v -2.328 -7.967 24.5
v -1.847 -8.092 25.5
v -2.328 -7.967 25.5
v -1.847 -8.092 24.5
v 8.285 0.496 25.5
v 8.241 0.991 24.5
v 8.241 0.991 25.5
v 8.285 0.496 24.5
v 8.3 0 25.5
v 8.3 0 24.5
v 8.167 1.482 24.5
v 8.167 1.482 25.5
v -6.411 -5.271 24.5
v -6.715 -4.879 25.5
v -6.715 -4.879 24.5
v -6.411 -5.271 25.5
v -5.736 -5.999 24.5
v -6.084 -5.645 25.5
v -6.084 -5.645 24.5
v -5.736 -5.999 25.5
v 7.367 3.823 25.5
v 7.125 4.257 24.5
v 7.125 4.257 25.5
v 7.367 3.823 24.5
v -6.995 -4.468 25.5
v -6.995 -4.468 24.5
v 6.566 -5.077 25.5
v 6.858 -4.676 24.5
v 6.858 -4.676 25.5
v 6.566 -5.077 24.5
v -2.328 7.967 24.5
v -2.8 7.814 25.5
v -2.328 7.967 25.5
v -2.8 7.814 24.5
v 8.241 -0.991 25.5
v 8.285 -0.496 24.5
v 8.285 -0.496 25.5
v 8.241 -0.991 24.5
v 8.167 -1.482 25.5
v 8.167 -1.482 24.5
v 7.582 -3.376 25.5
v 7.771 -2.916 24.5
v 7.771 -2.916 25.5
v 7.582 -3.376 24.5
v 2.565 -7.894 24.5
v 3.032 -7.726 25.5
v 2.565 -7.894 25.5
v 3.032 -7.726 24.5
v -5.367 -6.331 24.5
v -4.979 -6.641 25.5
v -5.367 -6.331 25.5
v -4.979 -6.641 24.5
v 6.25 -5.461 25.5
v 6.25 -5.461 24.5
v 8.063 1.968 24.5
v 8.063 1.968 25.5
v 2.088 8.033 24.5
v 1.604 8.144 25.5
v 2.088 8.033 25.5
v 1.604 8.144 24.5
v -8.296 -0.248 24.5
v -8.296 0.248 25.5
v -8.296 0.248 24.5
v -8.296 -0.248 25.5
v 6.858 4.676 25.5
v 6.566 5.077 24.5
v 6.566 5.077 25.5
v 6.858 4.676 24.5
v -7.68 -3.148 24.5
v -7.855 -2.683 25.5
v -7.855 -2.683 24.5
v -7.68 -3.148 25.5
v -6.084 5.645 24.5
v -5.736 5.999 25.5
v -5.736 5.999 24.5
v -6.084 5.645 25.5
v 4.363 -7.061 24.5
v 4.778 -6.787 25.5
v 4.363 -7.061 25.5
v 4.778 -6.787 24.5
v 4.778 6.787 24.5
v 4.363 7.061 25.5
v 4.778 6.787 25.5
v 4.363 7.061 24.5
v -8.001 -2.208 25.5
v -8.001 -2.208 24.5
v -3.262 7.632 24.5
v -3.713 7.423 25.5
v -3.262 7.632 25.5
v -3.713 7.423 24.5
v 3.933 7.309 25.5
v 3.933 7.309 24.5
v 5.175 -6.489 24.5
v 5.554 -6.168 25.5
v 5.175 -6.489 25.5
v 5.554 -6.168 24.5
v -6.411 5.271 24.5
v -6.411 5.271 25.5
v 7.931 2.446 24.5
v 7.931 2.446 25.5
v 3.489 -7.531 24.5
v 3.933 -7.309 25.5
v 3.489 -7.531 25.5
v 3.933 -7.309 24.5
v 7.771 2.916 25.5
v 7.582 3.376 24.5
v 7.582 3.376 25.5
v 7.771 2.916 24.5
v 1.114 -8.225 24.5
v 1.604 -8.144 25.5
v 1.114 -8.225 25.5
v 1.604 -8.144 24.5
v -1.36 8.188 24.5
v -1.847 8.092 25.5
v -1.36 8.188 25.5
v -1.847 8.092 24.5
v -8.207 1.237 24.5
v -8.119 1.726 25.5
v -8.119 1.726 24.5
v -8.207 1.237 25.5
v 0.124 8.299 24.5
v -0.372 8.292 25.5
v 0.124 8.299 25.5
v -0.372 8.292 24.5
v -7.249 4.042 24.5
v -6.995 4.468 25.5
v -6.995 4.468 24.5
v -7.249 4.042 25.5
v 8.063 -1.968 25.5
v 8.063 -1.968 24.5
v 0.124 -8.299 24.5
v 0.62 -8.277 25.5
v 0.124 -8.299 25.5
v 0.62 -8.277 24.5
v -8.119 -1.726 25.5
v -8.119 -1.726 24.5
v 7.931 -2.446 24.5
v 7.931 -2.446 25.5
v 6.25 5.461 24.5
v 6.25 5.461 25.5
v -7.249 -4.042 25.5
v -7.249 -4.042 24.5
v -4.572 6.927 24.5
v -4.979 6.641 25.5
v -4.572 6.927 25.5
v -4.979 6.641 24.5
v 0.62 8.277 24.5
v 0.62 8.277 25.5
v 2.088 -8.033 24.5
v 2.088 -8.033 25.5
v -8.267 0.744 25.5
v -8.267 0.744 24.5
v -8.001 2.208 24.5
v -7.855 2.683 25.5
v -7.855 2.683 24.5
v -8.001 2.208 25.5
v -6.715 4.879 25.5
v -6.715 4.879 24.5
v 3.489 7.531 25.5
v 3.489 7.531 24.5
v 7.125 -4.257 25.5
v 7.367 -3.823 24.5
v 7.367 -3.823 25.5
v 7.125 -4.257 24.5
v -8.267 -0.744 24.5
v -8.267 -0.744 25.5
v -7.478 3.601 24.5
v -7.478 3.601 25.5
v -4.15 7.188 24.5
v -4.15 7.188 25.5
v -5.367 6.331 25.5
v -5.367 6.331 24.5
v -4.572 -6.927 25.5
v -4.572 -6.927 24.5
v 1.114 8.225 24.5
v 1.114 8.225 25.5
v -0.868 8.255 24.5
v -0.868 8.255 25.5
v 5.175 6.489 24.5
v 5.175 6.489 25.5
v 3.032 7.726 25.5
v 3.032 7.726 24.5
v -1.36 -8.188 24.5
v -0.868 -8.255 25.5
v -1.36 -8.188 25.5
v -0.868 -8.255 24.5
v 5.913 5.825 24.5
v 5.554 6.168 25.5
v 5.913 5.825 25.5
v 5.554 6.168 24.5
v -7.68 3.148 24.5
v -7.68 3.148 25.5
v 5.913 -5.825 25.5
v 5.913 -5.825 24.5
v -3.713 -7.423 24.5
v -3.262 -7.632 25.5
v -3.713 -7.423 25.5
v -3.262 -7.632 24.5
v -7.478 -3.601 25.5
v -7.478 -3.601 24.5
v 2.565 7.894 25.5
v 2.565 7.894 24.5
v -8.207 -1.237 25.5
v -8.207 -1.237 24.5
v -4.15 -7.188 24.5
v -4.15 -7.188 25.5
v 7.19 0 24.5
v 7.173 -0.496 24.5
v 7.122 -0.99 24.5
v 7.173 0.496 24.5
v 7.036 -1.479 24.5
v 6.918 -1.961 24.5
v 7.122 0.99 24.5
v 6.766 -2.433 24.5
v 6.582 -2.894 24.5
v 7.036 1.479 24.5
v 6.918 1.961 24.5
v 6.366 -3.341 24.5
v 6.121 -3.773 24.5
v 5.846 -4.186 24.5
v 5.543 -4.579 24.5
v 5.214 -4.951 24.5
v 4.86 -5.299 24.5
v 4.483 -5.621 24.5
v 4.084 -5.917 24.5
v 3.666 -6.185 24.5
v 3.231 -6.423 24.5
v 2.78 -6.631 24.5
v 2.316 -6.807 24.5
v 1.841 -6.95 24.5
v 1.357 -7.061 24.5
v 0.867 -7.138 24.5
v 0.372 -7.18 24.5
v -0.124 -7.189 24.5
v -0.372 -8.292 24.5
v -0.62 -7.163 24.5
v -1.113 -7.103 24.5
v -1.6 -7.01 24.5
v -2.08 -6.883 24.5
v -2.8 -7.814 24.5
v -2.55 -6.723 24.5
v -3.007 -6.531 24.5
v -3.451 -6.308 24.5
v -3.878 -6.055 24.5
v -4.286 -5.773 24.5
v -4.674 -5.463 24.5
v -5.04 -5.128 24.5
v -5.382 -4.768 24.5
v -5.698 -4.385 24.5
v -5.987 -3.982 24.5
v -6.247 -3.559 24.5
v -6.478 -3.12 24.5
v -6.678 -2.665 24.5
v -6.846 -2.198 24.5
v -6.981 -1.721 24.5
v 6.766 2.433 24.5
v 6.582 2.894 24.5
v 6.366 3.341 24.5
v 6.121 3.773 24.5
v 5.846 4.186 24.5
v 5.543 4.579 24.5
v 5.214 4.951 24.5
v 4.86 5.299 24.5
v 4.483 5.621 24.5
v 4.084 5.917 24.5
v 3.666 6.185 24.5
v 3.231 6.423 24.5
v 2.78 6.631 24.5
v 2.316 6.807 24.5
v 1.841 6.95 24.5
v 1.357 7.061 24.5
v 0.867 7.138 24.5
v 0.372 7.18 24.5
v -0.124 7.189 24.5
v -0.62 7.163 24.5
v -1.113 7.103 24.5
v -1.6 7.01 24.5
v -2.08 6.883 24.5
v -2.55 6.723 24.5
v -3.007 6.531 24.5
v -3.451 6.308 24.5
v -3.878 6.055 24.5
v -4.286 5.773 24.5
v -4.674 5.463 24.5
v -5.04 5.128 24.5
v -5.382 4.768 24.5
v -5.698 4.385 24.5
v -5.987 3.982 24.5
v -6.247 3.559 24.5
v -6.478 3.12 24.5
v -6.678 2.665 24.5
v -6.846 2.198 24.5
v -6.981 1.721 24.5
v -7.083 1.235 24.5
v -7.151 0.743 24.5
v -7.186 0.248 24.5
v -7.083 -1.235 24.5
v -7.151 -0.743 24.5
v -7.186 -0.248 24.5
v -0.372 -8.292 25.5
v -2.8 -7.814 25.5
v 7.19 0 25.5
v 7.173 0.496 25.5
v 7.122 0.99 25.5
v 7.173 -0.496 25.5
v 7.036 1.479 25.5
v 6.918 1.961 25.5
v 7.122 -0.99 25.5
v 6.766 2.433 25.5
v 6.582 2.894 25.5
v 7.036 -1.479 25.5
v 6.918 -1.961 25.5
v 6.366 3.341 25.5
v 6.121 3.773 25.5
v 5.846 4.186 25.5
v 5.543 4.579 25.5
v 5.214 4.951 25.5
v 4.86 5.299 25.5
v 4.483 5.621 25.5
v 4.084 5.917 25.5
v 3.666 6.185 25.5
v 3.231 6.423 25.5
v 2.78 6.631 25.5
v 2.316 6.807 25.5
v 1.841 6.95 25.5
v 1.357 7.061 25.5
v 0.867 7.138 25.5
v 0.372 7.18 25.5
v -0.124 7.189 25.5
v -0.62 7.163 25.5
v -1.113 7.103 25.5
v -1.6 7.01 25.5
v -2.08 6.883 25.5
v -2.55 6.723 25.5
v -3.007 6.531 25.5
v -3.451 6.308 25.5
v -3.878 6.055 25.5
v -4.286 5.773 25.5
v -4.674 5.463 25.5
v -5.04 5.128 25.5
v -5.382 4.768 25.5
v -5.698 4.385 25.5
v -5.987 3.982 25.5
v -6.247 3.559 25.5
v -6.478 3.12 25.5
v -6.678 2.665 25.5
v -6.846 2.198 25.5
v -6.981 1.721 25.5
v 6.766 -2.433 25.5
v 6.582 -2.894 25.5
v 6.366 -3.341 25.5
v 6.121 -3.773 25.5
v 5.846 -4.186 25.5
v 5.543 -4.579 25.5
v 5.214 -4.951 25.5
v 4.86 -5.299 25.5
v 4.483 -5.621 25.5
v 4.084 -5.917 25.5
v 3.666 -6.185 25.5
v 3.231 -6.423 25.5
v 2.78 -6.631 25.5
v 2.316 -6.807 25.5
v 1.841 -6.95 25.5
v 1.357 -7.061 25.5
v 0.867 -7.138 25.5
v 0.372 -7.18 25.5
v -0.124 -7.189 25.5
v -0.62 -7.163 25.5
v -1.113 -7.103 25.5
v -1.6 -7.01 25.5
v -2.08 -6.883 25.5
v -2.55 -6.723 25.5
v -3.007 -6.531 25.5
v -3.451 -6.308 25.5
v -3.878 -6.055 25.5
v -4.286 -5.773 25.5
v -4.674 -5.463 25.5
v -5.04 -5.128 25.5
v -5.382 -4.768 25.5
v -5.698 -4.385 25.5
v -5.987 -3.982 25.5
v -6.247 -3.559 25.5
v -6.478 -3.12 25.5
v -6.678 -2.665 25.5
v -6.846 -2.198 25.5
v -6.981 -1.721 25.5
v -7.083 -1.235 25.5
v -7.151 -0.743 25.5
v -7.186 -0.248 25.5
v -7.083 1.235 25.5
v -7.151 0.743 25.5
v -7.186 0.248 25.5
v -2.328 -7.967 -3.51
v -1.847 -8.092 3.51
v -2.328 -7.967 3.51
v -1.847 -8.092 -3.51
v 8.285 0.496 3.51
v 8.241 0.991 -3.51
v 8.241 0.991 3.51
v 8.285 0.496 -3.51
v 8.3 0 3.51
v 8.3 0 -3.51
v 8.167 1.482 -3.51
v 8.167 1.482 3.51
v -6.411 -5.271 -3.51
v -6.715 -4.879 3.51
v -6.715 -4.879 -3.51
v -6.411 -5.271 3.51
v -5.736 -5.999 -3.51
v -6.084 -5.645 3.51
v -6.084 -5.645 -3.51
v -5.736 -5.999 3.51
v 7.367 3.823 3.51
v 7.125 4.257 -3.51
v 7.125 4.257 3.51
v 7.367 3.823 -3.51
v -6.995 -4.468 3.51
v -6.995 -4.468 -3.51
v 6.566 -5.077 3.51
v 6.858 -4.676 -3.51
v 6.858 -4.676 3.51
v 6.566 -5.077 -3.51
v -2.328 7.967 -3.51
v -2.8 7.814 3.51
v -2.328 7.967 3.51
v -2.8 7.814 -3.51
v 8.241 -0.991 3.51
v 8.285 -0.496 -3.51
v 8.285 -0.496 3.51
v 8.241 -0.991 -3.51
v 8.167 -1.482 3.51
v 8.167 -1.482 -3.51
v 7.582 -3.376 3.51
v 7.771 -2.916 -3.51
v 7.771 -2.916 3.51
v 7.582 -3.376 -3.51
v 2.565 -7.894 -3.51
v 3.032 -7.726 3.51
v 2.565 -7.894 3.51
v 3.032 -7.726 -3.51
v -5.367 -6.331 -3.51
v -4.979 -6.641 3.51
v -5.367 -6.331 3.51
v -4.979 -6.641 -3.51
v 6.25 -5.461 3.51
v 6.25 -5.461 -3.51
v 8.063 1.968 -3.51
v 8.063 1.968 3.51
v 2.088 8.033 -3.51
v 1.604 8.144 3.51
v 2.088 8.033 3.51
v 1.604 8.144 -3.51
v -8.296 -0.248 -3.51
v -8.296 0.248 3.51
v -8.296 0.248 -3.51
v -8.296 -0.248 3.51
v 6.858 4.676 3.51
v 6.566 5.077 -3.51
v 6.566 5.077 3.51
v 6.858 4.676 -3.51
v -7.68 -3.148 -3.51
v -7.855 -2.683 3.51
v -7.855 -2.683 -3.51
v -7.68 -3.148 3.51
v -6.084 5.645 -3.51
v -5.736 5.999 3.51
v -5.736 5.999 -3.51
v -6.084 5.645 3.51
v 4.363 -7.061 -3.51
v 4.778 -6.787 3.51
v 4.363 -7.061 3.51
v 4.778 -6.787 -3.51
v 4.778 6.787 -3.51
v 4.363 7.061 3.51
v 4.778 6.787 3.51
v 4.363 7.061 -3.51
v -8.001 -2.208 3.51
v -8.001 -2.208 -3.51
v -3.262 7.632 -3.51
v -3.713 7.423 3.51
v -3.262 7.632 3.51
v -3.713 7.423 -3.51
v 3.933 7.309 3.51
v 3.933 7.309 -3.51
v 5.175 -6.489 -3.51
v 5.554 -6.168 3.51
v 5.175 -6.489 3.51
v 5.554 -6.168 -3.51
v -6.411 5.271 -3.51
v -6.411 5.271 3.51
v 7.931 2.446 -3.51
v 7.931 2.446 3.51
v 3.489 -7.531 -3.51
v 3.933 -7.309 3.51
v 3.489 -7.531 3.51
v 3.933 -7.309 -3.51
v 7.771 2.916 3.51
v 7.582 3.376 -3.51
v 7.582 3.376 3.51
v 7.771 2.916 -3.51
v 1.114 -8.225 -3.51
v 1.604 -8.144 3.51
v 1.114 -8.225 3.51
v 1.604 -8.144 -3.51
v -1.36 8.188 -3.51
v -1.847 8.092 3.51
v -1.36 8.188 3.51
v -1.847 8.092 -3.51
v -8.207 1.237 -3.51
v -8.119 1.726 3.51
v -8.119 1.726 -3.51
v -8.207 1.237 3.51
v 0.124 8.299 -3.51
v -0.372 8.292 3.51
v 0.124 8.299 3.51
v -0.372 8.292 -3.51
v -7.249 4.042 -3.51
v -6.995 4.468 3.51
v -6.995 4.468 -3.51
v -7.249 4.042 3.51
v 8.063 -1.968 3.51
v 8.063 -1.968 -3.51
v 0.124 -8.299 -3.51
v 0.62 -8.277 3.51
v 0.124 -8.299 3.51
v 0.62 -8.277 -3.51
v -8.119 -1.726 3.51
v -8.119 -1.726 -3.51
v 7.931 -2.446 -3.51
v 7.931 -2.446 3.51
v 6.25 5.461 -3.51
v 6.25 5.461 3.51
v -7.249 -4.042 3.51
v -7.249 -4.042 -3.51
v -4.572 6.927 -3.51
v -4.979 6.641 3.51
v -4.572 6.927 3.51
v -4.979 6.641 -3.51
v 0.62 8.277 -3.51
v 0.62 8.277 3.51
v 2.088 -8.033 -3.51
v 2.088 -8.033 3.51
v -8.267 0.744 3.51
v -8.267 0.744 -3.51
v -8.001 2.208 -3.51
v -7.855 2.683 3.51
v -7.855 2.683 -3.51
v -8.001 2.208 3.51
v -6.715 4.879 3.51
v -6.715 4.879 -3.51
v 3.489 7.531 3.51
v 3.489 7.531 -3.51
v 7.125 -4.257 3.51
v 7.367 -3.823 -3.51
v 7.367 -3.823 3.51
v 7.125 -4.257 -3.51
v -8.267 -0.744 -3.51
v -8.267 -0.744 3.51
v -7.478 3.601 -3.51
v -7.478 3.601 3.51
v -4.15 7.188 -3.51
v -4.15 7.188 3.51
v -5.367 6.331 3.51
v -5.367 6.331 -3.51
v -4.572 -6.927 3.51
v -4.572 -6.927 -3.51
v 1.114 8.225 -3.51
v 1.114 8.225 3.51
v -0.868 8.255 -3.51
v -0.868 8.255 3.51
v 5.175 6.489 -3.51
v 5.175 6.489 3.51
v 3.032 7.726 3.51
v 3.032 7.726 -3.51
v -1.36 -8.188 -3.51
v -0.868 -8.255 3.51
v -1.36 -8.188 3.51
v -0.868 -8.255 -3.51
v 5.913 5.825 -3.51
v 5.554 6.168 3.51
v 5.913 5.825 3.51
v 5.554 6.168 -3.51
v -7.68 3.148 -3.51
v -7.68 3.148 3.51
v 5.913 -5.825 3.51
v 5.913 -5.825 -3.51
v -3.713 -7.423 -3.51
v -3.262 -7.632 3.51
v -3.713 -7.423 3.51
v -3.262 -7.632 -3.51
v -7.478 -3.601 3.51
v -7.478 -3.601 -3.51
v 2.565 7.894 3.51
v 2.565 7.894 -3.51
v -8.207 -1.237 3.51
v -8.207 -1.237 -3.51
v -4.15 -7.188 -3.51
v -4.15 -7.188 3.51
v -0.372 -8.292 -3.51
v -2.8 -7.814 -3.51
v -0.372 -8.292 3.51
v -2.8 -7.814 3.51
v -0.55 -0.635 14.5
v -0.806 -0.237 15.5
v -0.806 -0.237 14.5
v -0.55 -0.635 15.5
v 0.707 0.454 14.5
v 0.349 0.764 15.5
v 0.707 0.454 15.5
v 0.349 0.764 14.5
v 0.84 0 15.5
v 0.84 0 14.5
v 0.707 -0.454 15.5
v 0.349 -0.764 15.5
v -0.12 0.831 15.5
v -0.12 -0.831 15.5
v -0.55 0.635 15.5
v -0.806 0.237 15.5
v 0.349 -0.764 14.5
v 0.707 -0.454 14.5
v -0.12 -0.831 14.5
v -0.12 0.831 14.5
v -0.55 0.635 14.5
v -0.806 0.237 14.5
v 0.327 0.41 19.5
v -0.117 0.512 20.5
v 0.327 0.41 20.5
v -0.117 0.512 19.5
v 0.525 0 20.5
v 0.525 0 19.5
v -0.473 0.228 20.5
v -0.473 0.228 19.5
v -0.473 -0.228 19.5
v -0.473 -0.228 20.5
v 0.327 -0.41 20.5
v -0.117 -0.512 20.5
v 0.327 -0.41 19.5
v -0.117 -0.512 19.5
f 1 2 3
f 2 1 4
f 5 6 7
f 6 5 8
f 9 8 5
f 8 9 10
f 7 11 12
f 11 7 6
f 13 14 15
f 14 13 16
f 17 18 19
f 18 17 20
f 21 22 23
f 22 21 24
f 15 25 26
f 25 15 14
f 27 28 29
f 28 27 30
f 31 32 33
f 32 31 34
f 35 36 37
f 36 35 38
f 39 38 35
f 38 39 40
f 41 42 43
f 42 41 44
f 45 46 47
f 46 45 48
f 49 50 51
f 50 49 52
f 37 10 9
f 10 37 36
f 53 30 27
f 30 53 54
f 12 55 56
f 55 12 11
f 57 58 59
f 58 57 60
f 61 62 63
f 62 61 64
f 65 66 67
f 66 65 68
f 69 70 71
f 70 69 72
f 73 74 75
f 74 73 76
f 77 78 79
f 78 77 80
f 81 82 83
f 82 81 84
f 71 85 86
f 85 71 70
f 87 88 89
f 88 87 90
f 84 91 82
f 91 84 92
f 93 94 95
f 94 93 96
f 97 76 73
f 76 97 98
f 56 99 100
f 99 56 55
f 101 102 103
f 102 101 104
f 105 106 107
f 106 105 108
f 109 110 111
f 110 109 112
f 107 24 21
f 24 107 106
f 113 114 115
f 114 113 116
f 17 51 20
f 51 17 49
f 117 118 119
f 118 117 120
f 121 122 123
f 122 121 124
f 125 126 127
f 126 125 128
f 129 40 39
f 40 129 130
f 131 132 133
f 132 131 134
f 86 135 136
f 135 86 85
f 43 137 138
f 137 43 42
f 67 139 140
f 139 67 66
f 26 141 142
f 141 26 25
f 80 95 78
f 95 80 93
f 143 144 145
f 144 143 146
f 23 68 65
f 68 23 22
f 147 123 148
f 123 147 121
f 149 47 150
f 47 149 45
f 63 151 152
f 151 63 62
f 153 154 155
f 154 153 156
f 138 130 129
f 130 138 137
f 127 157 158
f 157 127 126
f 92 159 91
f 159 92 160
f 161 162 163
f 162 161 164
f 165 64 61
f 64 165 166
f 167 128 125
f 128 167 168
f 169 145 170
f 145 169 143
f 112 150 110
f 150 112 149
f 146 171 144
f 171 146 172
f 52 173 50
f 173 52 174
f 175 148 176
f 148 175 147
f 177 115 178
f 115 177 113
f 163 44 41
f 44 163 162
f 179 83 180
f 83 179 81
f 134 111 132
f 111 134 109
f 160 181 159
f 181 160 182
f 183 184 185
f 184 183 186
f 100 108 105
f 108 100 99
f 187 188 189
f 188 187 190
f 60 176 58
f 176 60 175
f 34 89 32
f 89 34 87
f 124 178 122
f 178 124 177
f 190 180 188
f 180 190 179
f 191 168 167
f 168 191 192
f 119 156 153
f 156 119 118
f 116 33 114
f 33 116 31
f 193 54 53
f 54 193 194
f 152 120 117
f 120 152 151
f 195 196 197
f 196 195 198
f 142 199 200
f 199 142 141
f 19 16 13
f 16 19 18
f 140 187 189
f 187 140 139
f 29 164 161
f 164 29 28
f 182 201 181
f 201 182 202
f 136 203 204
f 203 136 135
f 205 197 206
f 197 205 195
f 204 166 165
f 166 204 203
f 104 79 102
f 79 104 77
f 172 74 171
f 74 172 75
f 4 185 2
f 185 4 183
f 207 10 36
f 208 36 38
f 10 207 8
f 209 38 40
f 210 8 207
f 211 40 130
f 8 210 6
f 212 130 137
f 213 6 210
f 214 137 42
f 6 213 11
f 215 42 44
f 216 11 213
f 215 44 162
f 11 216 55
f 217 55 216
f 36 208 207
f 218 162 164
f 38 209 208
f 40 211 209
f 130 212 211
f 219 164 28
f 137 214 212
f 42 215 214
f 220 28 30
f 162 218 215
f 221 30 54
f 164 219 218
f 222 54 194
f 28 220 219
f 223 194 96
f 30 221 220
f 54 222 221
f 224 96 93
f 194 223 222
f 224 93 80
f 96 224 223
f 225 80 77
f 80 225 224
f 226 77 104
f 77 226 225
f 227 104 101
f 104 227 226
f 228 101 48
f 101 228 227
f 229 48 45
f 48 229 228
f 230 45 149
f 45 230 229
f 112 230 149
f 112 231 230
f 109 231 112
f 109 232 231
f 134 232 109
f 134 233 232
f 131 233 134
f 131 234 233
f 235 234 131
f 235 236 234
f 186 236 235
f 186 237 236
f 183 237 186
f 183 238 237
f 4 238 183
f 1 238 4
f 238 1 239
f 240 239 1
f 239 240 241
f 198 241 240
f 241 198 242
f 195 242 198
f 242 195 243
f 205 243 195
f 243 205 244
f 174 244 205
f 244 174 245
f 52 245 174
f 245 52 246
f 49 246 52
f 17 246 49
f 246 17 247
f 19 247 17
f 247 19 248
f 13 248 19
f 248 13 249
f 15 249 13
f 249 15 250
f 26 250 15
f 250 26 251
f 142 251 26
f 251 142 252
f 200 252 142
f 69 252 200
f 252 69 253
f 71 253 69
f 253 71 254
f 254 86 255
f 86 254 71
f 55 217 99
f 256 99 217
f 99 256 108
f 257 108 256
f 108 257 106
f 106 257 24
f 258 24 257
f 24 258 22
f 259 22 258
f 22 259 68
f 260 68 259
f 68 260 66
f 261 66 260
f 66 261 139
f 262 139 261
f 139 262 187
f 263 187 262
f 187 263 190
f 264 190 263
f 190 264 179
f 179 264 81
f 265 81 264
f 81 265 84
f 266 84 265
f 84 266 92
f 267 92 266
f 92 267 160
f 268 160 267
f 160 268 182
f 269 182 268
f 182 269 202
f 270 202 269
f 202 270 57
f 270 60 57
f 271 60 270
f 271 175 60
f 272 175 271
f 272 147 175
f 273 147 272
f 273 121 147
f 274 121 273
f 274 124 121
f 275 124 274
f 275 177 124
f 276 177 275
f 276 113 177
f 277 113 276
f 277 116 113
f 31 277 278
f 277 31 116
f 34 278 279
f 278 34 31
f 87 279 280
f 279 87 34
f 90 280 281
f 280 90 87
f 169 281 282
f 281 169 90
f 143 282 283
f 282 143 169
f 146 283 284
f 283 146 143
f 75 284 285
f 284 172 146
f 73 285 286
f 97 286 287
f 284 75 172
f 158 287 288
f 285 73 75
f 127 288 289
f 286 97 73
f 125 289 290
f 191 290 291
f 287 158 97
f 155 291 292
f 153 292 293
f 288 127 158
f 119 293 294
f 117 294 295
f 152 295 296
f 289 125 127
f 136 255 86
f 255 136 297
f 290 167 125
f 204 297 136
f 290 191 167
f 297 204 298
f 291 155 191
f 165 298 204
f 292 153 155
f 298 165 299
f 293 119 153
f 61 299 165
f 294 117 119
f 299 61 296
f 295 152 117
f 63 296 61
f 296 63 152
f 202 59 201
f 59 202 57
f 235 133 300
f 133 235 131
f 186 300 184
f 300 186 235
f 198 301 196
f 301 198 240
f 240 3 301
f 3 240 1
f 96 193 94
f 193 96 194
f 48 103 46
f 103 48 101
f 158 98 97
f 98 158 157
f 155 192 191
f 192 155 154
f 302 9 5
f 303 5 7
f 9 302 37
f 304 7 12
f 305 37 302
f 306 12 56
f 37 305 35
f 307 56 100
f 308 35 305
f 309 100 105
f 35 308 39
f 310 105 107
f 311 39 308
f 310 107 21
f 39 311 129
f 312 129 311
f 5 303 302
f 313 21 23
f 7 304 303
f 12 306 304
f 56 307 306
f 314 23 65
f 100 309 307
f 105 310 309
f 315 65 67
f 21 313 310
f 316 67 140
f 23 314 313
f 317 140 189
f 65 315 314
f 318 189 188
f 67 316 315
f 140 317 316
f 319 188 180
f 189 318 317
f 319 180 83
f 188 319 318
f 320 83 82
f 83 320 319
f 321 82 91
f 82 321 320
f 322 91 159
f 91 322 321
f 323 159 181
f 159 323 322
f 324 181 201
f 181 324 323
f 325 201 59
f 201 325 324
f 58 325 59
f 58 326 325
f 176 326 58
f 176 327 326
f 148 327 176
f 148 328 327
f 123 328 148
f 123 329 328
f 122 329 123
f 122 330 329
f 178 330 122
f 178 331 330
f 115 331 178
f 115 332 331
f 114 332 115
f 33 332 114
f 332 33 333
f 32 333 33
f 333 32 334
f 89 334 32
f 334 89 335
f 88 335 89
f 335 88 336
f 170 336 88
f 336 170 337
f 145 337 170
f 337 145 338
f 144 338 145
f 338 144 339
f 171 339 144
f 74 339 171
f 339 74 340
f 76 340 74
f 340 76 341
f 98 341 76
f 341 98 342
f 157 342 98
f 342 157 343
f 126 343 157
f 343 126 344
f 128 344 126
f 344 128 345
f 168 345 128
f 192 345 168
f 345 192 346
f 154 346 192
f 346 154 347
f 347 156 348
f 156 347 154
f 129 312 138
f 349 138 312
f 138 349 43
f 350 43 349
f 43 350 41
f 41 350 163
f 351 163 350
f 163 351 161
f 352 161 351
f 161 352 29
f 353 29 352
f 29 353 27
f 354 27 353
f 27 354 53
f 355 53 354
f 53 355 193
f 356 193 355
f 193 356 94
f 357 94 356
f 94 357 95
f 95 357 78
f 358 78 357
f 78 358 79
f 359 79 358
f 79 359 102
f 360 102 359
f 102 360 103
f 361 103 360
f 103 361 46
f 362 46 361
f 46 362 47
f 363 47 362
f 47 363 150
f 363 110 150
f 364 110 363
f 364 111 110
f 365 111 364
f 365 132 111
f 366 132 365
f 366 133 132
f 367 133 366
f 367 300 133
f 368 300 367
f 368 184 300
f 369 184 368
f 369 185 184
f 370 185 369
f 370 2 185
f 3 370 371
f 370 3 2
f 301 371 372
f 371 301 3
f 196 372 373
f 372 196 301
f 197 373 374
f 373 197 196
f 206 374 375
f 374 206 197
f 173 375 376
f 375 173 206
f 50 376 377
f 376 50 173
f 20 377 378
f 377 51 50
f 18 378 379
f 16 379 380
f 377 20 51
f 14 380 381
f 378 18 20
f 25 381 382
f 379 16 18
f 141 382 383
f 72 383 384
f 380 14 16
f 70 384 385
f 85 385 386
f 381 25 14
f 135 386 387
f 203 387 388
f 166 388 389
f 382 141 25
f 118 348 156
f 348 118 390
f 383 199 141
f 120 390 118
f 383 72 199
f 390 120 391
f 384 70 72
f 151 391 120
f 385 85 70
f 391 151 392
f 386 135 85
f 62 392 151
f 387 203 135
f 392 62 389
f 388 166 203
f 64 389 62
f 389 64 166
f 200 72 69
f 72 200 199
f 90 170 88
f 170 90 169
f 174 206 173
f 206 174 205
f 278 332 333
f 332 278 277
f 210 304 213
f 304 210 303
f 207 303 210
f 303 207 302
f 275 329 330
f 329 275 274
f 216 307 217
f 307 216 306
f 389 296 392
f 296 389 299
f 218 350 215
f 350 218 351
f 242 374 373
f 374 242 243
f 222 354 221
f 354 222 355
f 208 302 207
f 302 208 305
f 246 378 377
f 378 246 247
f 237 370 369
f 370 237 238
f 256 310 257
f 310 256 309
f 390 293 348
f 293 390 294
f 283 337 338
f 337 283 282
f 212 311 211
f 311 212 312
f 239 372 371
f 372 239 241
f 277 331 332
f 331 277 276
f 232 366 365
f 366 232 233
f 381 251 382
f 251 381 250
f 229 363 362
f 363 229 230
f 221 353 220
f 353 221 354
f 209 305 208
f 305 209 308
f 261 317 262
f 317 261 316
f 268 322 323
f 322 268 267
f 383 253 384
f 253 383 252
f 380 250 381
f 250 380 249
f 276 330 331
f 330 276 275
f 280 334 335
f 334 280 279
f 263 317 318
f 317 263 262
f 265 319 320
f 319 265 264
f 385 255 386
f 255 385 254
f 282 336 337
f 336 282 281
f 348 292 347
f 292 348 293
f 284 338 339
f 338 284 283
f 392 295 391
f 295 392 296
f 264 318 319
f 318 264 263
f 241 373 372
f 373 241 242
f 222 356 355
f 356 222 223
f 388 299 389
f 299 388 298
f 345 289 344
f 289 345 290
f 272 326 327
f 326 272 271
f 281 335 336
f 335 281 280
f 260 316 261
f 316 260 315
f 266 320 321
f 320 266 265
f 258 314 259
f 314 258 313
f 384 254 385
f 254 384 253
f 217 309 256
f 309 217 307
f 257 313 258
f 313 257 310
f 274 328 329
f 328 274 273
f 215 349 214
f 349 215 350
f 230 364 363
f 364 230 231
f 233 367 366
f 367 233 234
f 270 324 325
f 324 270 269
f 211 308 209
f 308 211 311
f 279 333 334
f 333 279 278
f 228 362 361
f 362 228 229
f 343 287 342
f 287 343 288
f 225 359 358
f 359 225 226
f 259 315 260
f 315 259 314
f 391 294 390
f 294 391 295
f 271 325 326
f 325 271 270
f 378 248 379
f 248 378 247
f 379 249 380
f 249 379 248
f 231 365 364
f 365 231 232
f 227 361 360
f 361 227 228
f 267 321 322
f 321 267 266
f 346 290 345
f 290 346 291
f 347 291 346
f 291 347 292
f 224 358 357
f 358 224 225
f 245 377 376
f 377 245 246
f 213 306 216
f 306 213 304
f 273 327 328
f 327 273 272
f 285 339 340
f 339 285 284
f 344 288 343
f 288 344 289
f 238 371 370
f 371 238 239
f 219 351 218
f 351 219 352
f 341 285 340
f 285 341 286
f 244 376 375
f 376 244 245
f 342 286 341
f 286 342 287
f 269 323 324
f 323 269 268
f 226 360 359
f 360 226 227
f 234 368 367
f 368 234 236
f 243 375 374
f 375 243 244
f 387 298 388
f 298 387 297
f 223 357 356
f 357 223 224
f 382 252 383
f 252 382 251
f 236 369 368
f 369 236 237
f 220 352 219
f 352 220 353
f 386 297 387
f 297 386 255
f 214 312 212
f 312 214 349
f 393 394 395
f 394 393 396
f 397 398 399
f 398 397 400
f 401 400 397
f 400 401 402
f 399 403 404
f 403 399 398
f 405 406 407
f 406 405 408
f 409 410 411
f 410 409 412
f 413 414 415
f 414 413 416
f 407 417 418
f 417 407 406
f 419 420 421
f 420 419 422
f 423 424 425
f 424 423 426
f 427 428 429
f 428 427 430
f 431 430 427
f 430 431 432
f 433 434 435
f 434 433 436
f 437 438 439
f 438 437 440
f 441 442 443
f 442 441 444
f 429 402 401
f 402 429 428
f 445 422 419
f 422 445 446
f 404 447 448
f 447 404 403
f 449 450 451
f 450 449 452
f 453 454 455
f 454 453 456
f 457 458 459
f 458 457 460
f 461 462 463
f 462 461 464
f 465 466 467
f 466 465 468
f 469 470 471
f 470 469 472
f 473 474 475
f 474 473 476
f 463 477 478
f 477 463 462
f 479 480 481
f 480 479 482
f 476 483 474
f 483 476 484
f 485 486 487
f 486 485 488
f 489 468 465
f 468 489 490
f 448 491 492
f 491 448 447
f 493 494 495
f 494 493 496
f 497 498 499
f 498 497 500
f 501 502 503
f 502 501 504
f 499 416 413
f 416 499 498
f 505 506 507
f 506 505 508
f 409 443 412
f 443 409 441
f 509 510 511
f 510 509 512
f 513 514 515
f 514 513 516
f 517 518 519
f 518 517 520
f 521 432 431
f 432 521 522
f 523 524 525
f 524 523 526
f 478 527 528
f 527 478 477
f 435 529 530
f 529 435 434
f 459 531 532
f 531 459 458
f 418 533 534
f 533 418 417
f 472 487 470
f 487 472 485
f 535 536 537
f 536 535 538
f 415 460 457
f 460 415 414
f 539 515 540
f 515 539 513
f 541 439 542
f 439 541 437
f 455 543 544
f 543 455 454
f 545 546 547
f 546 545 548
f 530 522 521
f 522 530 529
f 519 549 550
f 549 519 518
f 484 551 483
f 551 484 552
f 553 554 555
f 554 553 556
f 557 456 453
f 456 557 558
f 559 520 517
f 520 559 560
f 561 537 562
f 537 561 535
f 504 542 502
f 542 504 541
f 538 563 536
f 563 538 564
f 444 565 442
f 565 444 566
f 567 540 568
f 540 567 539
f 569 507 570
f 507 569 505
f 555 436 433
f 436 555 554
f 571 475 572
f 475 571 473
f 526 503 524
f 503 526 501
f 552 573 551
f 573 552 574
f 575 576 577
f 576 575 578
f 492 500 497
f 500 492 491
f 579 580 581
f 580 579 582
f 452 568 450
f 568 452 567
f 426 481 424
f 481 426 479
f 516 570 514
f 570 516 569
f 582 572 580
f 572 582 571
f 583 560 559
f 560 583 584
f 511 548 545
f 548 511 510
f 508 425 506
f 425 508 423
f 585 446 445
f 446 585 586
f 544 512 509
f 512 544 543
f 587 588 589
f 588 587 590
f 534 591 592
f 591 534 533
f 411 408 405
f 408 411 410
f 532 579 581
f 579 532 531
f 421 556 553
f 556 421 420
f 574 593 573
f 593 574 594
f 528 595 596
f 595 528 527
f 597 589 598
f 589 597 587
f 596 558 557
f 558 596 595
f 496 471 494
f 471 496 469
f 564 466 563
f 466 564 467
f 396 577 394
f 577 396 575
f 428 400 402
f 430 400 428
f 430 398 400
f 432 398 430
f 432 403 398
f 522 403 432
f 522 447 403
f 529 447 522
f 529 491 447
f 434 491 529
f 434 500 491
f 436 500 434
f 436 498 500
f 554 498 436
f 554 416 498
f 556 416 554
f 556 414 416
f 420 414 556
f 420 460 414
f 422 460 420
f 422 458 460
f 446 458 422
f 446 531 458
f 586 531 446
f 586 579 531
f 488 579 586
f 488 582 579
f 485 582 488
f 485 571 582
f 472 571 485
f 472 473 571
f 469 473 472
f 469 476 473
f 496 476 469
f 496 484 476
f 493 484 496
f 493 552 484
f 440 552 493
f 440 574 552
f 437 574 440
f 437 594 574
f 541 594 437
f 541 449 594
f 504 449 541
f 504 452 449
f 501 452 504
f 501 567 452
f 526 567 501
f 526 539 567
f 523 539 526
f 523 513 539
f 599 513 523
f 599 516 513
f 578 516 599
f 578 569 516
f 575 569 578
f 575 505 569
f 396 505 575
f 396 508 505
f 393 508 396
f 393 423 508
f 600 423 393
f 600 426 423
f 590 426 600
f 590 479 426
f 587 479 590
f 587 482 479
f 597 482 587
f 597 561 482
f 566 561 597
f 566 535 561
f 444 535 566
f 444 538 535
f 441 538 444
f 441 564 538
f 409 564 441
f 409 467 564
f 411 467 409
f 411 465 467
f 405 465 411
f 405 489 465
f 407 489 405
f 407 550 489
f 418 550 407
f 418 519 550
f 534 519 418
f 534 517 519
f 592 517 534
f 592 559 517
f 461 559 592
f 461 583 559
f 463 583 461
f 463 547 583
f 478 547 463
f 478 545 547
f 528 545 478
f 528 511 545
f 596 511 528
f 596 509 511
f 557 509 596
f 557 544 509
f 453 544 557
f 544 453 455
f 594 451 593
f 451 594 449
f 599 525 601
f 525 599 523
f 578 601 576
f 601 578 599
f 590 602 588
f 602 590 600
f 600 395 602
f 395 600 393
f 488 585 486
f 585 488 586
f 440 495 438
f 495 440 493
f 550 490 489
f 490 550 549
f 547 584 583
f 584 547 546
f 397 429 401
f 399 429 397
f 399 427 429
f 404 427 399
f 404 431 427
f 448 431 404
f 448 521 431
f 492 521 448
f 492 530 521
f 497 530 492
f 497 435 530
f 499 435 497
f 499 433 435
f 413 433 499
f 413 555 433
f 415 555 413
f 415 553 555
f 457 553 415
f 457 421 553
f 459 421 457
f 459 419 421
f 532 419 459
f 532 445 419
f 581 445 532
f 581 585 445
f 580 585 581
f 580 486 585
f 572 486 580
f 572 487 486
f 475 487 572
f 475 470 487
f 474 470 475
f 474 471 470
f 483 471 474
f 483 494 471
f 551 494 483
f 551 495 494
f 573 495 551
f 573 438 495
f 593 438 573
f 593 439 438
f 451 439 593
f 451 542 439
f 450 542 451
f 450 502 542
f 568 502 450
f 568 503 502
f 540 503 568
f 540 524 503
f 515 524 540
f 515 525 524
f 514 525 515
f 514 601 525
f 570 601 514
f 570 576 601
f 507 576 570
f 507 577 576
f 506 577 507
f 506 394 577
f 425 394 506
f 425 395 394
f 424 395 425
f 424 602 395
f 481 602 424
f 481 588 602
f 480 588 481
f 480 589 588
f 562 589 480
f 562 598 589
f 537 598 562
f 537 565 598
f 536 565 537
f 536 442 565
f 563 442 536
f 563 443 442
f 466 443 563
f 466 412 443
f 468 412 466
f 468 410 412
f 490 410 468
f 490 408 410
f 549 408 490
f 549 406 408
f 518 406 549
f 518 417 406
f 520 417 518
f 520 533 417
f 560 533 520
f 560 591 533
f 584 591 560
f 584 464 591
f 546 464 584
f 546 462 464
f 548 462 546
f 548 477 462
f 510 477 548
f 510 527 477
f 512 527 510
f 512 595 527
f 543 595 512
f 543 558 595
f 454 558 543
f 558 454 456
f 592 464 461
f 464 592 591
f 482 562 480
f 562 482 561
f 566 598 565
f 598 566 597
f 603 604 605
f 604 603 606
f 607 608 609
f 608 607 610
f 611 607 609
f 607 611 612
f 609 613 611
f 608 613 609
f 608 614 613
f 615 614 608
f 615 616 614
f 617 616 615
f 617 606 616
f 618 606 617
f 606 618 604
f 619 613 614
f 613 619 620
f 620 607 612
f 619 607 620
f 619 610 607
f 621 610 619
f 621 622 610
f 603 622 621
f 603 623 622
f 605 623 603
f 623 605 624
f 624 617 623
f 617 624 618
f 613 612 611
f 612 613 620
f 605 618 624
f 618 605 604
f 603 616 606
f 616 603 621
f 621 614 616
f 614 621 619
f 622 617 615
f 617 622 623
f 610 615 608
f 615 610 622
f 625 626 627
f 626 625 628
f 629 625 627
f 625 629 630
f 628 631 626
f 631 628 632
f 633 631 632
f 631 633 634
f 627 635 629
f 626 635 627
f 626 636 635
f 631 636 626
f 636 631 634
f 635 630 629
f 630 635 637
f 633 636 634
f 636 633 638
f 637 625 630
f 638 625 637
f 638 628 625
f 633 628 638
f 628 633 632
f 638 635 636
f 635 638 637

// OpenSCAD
$fa=0.01;
$fs=0.5;

module body() {
	cylinder(r=16.6/2, h=7.02, center=true);
}

body();

module ring() {
	difference() {
		cylinder(r=16.6/2, h=1, center=true);
		cylinder(r=(16.6/2)-2.22/2, h=2, center=true);
	}
}

translate([0,0,25])
ring();


module frontHole() {
	cylinder(r=1.68/2,h=1,center=true);
}

translate([0,0,15])
frontHole();

module backHole() {
	cylinder(r=1.05/2,h=1,center=true);
}

translate([0,0,20])
backHole();

module holes() {

for(i=[1:6]) {
	translate([i,0,0])
	frontHole();
}

}
